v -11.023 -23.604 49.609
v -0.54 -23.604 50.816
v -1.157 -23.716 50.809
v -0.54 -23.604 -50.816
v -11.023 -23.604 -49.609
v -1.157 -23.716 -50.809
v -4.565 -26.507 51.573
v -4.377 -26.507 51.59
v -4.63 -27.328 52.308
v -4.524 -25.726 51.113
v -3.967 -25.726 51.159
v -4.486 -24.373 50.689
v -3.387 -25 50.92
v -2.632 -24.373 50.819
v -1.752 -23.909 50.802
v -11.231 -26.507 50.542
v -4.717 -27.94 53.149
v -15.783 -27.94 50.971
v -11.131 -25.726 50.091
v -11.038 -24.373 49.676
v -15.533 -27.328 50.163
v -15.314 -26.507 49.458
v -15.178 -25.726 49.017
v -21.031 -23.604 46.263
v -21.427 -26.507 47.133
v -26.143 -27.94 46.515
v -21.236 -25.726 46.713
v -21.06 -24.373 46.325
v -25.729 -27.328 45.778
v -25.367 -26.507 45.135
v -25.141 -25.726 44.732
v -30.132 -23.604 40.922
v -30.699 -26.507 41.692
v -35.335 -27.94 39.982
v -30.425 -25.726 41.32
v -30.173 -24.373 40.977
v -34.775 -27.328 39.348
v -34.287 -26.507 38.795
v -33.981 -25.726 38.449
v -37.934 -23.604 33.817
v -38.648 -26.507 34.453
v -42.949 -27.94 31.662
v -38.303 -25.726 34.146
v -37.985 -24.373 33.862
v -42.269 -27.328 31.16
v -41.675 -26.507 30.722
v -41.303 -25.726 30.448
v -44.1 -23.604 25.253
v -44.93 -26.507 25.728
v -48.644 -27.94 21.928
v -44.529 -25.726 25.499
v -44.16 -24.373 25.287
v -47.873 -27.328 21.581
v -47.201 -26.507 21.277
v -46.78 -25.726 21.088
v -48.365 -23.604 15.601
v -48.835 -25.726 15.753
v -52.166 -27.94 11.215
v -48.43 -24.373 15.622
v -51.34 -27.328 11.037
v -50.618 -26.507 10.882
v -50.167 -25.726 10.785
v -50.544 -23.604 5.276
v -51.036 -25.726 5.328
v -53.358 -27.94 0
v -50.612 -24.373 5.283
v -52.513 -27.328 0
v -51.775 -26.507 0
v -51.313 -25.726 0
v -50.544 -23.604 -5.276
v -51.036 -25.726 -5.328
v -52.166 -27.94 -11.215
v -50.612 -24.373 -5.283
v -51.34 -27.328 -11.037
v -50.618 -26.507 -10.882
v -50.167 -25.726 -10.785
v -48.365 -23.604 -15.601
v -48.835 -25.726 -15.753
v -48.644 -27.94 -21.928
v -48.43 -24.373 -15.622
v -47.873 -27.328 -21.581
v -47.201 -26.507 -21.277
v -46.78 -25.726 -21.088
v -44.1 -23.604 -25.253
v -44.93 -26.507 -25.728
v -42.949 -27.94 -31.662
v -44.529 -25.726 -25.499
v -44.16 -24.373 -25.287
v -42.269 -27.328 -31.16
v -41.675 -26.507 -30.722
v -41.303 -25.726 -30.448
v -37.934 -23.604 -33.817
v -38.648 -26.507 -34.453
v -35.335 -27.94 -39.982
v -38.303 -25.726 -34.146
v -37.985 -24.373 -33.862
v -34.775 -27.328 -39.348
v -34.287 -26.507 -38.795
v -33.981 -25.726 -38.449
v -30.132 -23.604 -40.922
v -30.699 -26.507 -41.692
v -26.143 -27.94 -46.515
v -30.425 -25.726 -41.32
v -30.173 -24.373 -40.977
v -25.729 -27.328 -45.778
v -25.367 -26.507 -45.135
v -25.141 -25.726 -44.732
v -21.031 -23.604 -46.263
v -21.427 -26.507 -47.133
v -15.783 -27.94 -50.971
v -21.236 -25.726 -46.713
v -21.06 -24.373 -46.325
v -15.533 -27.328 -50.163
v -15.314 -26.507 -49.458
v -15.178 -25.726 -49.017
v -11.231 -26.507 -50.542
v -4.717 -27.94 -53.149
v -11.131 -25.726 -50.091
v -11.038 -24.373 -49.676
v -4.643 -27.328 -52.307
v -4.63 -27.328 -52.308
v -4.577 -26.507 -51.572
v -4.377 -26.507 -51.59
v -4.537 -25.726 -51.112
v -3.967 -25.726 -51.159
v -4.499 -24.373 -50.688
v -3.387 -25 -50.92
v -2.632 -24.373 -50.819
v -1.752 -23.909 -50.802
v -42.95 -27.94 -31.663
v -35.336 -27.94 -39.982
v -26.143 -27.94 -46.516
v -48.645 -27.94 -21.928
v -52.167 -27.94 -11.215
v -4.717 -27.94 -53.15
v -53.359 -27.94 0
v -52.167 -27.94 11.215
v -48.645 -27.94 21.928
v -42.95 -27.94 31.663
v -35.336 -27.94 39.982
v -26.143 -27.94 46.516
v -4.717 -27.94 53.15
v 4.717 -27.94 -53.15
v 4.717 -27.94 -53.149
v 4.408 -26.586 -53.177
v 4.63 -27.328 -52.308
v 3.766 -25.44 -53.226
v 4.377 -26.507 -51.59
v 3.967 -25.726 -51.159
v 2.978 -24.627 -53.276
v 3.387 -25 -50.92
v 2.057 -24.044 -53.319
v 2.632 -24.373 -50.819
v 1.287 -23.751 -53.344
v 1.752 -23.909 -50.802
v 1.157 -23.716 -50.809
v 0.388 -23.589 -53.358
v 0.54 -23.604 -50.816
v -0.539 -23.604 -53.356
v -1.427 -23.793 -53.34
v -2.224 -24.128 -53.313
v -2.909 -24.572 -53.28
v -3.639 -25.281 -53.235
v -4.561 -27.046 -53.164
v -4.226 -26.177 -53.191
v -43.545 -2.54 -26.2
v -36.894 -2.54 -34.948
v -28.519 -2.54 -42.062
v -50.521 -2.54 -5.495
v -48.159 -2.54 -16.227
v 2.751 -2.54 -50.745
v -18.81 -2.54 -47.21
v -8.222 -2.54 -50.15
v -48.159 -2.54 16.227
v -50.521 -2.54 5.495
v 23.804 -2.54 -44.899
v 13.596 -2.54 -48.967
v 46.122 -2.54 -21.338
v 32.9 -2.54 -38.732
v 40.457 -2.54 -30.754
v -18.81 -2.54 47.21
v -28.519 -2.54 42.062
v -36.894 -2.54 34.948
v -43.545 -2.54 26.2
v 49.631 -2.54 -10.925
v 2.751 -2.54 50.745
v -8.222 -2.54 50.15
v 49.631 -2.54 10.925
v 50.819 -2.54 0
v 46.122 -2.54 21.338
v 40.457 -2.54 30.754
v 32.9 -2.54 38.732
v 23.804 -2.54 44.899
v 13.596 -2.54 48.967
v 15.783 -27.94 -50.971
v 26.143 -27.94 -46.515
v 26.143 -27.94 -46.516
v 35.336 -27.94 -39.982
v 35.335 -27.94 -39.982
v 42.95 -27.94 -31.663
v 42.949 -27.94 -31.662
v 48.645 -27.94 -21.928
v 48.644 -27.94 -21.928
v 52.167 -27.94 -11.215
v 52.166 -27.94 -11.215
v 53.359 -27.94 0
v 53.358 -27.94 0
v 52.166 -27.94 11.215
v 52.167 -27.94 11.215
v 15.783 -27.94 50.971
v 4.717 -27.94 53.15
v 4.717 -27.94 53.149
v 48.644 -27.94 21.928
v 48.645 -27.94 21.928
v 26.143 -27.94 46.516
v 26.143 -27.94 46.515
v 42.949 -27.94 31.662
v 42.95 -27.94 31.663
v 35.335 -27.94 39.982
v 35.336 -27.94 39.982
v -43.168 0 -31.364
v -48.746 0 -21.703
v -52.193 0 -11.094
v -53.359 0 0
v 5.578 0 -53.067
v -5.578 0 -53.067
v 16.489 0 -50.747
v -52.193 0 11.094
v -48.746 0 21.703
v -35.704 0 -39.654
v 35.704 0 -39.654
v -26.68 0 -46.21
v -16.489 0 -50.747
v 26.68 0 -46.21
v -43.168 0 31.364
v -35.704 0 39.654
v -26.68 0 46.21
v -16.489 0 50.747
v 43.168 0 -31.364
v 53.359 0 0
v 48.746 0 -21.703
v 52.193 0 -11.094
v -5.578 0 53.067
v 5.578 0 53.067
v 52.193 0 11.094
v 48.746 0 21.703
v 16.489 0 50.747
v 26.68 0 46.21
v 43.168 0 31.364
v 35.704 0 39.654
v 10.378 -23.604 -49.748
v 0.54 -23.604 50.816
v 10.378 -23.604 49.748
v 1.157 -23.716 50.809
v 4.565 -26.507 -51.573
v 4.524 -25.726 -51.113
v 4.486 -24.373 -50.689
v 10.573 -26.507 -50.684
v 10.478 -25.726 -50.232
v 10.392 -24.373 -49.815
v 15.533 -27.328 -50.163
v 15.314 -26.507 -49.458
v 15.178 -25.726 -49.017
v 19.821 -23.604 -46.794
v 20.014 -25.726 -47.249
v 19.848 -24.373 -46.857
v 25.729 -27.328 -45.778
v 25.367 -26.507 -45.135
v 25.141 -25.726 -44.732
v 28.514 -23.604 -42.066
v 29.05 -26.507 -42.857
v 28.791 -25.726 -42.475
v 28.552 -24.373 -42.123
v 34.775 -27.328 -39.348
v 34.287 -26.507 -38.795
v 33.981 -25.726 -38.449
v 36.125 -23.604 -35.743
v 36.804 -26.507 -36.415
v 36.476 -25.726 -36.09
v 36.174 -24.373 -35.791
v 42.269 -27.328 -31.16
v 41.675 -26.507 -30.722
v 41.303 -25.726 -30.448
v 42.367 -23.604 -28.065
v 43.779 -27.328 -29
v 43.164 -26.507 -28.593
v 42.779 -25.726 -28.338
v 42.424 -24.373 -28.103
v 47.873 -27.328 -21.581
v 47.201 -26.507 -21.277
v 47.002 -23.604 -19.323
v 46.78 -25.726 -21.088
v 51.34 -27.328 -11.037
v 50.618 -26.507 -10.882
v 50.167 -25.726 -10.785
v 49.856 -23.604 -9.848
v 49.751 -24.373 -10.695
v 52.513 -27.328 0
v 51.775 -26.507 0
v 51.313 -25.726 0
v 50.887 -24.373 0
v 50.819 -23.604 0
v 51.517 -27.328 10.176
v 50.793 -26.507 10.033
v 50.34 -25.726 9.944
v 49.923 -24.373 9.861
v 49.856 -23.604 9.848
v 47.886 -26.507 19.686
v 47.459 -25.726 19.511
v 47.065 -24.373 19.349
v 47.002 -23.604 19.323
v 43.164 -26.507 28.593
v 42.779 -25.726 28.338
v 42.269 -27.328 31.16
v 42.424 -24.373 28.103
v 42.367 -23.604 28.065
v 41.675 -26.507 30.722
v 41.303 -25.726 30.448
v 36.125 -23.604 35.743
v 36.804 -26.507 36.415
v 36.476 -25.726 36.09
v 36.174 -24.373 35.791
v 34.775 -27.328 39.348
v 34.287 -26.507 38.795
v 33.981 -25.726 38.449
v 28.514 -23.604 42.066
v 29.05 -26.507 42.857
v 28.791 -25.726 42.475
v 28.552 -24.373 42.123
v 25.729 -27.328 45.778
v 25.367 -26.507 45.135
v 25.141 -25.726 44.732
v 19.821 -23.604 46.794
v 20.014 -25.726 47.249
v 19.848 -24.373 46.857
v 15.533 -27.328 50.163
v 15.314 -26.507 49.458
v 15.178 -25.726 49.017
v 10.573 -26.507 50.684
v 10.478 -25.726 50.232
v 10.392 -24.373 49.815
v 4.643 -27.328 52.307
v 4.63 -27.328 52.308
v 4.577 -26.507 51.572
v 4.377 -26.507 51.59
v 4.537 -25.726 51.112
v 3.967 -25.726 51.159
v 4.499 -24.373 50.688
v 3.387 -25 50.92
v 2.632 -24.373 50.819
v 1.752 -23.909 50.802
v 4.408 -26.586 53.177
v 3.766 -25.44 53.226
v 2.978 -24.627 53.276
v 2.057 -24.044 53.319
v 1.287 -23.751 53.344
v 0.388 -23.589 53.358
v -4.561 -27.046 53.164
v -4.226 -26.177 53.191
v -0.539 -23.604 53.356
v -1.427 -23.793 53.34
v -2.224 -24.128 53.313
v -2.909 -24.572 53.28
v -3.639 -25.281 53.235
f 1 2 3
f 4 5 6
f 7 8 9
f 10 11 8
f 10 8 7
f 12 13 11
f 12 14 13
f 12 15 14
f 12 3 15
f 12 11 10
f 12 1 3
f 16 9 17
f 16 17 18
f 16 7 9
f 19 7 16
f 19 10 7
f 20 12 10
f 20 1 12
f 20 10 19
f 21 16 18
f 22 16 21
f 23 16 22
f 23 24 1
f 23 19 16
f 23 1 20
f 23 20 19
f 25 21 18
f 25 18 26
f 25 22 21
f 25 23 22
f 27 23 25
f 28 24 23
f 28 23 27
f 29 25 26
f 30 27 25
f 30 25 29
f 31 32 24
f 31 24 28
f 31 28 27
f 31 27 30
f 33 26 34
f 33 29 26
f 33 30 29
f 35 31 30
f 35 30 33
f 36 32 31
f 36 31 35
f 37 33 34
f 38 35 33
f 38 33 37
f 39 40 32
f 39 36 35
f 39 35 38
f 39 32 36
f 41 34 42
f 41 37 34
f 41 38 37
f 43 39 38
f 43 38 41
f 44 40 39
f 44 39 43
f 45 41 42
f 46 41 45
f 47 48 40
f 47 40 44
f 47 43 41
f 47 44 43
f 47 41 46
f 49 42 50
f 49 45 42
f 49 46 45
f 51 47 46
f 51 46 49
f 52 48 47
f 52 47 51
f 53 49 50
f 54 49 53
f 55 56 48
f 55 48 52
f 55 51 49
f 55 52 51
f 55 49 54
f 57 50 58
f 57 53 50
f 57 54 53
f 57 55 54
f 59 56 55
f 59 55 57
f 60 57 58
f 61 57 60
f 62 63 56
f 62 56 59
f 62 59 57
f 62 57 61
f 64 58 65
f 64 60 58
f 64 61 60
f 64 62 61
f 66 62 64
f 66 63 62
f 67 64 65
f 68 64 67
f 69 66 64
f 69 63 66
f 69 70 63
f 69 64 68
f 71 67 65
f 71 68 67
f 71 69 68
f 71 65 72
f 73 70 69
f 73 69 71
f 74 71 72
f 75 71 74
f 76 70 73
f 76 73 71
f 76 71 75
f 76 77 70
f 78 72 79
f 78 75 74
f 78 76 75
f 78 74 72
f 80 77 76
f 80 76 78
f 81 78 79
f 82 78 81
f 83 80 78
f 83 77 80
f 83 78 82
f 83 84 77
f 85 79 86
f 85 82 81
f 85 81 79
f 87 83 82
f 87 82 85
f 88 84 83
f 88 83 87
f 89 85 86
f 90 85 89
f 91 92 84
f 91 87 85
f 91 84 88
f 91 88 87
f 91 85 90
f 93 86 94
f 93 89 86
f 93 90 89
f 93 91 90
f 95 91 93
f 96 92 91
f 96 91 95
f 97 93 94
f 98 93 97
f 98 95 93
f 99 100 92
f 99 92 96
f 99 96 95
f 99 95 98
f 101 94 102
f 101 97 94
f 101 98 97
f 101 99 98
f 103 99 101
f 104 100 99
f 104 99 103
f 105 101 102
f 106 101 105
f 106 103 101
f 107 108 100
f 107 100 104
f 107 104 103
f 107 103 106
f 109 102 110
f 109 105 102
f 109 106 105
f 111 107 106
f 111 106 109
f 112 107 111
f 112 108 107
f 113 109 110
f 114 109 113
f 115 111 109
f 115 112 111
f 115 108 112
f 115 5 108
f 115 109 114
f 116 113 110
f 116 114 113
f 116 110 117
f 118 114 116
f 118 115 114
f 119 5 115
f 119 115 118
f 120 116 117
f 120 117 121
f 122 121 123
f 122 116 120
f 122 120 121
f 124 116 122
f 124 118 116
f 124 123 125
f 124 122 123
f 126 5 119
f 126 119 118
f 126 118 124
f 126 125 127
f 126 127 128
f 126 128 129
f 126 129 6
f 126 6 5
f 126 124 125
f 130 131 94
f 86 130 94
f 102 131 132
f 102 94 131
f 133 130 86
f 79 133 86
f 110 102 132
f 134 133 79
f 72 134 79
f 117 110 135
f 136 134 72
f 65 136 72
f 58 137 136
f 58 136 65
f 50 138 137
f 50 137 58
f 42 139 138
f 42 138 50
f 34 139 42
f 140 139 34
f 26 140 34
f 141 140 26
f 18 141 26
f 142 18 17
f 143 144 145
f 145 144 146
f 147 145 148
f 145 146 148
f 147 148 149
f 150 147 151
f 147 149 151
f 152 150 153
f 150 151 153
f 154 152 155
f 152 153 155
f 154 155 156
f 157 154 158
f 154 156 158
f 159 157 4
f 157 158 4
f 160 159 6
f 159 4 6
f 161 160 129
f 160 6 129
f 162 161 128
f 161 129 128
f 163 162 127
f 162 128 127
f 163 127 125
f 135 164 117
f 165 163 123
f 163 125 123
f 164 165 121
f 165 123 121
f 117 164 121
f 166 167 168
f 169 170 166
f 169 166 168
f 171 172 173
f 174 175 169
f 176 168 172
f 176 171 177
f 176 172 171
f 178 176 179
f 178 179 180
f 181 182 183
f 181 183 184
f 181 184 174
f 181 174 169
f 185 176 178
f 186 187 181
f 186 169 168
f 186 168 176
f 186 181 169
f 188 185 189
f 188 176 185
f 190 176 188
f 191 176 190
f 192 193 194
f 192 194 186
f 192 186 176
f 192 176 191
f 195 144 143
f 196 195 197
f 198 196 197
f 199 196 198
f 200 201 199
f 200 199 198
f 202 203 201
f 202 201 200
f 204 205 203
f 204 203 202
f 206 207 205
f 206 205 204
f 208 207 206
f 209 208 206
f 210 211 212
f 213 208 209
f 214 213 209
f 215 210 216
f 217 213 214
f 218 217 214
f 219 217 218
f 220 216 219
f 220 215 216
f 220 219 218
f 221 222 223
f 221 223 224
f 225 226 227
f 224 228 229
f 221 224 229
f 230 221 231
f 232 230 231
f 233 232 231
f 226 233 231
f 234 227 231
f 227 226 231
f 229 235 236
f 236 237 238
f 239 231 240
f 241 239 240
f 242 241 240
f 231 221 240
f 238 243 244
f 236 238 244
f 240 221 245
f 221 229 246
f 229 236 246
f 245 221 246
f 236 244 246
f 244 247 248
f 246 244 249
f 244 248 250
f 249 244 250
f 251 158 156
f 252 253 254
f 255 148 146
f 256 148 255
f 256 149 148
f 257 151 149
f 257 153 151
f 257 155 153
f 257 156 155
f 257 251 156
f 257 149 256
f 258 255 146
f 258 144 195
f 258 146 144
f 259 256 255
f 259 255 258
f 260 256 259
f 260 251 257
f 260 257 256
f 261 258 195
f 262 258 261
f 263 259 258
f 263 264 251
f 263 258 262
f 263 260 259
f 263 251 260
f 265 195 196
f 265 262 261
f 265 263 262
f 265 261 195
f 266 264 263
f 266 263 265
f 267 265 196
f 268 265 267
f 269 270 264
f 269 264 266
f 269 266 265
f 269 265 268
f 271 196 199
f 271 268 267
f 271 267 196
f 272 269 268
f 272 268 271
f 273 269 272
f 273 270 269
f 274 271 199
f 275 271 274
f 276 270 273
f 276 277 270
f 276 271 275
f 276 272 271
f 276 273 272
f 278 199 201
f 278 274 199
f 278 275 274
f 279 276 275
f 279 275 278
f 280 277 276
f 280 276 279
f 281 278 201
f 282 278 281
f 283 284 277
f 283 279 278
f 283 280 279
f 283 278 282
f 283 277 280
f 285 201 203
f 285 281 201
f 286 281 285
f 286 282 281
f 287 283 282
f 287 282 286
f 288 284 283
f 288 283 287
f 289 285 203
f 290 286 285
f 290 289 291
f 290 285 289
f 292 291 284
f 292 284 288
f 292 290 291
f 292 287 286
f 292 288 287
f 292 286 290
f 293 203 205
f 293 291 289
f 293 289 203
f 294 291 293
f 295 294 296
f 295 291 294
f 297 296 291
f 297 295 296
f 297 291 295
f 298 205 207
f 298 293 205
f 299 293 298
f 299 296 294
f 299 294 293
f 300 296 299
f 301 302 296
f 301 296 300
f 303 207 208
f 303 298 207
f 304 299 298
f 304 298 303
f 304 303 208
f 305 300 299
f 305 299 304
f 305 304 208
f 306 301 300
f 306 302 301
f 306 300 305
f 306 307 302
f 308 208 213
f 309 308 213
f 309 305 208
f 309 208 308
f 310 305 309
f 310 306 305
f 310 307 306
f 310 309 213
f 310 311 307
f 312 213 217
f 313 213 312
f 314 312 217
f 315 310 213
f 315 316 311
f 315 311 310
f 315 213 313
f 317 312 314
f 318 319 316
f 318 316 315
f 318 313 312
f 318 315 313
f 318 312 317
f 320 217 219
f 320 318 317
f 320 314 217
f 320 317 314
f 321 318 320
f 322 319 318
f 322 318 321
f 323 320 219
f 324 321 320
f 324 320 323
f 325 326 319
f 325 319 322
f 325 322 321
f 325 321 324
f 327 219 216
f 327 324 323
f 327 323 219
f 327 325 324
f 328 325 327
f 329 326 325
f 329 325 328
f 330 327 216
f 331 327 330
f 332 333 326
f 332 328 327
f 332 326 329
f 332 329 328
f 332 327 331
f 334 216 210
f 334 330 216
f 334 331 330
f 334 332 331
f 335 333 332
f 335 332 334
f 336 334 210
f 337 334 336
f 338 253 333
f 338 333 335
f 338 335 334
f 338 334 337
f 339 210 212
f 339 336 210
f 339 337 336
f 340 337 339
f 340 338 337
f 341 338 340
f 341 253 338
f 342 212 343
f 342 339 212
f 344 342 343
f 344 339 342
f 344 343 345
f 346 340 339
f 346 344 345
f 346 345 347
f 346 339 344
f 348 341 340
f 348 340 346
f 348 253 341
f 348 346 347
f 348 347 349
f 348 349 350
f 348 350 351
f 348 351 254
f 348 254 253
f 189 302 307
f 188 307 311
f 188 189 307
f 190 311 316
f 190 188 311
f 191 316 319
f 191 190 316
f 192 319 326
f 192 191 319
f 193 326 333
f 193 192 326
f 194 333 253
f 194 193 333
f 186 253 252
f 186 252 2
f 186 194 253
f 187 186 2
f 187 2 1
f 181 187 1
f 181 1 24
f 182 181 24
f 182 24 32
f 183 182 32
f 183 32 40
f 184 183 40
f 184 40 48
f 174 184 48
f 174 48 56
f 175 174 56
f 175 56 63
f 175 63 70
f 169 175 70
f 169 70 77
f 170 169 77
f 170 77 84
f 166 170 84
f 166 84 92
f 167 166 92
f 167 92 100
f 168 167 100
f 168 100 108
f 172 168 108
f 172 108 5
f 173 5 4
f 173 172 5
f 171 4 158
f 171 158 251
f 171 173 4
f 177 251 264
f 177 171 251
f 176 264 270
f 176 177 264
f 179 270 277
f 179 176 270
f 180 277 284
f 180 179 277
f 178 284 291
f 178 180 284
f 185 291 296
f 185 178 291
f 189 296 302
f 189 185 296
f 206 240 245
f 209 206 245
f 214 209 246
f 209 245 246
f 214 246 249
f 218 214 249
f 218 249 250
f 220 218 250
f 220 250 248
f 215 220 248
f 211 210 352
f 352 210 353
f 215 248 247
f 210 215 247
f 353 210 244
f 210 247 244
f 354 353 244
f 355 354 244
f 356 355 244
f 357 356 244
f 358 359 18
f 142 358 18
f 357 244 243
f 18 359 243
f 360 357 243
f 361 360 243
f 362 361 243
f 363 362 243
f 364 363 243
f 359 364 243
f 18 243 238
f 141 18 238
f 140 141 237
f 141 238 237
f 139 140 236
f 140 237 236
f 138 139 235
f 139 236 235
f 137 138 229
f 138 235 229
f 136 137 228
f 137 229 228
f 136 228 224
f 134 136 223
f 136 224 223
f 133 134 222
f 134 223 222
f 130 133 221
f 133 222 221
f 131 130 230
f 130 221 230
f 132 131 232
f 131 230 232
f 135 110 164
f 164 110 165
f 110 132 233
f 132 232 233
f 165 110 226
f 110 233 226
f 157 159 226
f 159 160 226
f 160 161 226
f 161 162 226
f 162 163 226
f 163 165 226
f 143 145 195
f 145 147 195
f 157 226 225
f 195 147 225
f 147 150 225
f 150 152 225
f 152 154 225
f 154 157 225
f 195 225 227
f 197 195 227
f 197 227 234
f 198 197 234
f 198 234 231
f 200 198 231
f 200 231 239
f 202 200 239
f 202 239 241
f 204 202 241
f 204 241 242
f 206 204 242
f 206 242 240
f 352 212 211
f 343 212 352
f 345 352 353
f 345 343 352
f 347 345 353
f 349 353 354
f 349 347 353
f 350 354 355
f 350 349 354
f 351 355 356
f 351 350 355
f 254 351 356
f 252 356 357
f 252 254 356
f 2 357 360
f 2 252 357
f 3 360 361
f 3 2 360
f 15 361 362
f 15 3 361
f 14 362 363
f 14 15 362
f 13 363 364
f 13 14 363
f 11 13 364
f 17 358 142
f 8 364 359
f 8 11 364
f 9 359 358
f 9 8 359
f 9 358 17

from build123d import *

# Parameters (mm, degrees)
F0_R          = 53.3590641314
F1_DEPTH      = 2.54
F2_R          = 53.3590641314
F2_R_2        = 50.8190641314
F3_DEPTH      = 25.4
F5_R          = 4.731473746
F6_DEPTH      = 53.3600641314
F6_DEPTH_BACK = 53.3600641314


# Not quite as in the source:
# - a fillet or chamfer that OpenCascade refuses, or shapes differently, is made with other operations: its cross-section is extruded or revolved along the edge and cut away or added


with BuildPart() as f1:
    # F0 (on Front) → F1 (new body)
    with BuildSketch(Plane.XZ):
        Circle(F0_R)
    extrude(amount=F1_DEPTH)

    # F2 (on face) → F3 (join)
    with BuildSketch(Plane.XZ.offset(2.54)):
        Circle(F2_R)
        Circle(F2_R_2, mode=Mode.SUBTRACT)
    extrude(amount=F3_DEPTH)

    # F4: fillet of radius 5.08 on 1 edges, made by hand

    # F4_s1 → F4_t2 (revolve, cut)
    with BuildSketch(Plane.XY):
        with BuildLine():
            ThreePointArc((53.3588640934, -27.9403463882), (51.4992986538, -26.0804748362), (50.8186641314, -23.5400334454))
            Line((50.8186641314, -23.5400334454), (50.3105275628, -23.5400334454))
            ThreePointArc((50.3105275628, -23.5400334454), (50.3109275628, -25.7400167227), (50.3109275628, -27.94))
            Line((50.3109275628, -27.94), (50.8190641314, -28.4481365685))
            ThreePointArc((50.8190641314, -28.4481365685), (52.0889641124, -28.4481365685), (53.104747521, -28.3803776825))
            Line((53.104747521, -28.3803776825), (53.3588640934, -27.9403463882))
        make_face()
    revolve(axis=Axis((0, -27.94, 0), (0, -1, 0)), mode=Mode.SUBTRACT)

    # F5 (on Top) → F6 (cut, two sides)
    with BuildSketch(Plane.XY) as f6_sk:
        with Locations((0, -28.3043142408)):
            Circle(F5_R)
    extrude(amount=-F6_DEPTH, mode=Mode.SUBTRACT)
    extrude(f6_sk.sketch, amount=F6_DEPTH_BACK, mode=Mode.SUBTRACT)


solid = f1.part
